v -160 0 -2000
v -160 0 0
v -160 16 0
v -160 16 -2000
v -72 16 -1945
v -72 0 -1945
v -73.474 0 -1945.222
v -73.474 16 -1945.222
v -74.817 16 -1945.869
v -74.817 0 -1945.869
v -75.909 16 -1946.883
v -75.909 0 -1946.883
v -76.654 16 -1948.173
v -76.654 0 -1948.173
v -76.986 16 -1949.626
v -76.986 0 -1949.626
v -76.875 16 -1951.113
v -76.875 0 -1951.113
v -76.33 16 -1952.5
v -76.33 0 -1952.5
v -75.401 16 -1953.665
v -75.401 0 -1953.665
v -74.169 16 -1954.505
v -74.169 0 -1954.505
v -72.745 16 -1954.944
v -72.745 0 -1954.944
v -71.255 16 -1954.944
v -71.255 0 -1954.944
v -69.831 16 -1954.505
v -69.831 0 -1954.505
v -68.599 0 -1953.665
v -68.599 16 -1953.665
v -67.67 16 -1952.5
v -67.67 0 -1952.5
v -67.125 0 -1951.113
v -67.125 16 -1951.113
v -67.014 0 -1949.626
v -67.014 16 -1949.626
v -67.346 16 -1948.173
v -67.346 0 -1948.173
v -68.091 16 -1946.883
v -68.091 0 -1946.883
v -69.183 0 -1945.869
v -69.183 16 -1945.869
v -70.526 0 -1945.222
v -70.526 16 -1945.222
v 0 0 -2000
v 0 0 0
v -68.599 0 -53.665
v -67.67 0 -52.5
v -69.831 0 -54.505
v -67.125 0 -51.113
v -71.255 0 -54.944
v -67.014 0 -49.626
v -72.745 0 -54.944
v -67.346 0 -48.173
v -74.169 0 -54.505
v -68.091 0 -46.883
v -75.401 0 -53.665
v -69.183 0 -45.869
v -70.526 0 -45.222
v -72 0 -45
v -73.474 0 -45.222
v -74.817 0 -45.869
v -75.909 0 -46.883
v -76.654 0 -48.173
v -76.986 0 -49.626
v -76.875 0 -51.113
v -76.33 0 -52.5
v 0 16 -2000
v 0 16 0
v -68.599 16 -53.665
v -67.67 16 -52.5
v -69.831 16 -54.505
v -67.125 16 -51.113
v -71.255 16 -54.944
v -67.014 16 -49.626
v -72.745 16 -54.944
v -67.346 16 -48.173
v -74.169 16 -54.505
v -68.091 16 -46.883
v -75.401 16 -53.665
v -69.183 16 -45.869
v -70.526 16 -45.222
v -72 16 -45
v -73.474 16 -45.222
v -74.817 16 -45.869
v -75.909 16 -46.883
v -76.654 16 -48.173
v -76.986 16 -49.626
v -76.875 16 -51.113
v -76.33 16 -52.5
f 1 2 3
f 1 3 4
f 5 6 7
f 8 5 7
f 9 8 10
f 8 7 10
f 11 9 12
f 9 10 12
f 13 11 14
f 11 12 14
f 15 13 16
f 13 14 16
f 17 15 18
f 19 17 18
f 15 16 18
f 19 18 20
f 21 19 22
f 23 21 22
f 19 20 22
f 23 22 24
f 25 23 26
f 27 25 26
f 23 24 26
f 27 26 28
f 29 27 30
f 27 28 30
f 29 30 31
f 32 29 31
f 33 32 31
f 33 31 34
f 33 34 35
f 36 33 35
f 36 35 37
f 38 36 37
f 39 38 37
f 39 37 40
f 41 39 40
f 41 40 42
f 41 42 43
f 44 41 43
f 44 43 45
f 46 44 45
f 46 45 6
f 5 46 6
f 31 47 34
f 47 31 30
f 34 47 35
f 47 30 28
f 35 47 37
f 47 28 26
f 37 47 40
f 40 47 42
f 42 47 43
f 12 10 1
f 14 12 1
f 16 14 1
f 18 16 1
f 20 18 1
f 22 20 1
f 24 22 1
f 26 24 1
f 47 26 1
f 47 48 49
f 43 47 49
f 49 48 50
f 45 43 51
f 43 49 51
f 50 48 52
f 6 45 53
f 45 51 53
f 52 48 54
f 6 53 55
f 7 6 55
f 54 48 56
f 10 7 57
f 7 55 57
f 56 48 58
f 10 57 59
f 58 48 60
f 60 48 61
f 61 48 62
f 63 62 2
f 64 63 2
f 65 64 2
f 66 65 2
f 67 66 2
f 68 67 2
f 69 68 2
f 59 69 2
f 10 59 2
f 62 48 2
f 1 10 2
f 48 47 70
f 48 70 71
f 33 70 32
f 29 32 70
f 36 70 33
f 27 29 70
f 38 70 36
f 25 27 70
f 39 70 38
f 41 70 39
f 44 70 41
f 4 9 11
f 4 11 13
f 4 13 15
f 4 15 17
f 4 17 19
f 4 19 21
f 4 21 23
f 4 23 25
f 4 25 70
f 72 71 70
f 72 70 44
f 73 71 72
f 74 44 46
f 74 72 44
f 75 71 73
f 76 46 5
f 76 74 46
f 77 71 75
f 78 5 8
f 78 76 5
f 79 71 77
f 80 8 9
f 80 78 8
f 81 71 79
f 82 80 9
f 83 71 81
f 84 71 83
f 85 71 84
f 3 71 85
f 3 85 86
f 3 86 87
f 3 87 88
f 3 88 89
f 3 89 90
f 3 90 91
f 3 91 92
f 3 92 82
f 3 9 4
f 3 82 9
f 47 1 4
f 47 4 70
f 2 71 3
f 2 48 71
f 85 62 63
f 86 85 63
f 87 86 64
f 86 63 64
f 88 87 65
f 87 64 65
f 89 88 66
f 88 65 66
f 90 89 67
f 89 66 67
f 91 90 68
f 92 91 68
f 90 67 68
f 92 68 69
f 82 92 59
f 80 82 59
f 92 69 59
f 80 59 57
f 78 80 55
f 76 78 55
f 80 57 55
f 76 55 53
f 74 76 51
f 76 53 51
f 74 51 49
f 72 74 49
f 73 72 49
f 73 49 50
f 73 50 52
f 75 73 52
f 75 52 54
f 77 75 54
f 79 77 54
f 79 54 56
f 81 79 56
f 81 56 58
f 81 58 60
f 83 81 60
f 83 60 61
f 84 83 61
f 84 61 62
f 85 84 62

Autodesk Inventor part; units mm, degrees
ref_plane "YZ Plane" through (0, 0, 0) normal (1, 0, 0) x (0, 1, 0)
ref_plane "XZ Plane" through (0, 0, 0) normal (0, 1, 0) x (-1, 0, 0)
ref_plane "XY Plane" through (0, 0, 0) normal (0, 0, 1) x (1, 0, 0)
sketch "Skizze1" plane through (0, 0, 0) normal (0, 1, 0) x (-1, 0, 0)
  line L0 (0, 0) -> (160, 0)
  line L1 (160, 0) -> (160, -2000)
  line L2 (160, -2000) -> (0, -2000)
  line L3 (0, -2000) -> (0, 0)
  dimension "d0" = 160
  dimension "d1" = 2000
extrude "Extrusion1" add sketch "Skizze1" along normal blind 16
sketch "Skizze2" plane through (0, 16, 0) normal (0, 1, 0) x (1, 0, 0)
  line L0 (-160, 0) -> (0, 0) projected
  line L1 (0, 0) -> (0, 2000) projected
  line L2 (0, 2000) -> (-160, 2000) projected
  line L3 (-160, 2000) -> (-160, 0) projected
  point P0 (-72, 50)
  point P1 (-72, 1950)
  dimension "d5" = 50
  dimension "d6" = 50
  dimension "d16" = 72
hole "Bohrung1" at (-72, 16, -50) at (-72, 16, -1950) direction (0, -1, 0) diameter 10 end through all
properties part number "spielfeld_trennwand" material "Spanplatte"
